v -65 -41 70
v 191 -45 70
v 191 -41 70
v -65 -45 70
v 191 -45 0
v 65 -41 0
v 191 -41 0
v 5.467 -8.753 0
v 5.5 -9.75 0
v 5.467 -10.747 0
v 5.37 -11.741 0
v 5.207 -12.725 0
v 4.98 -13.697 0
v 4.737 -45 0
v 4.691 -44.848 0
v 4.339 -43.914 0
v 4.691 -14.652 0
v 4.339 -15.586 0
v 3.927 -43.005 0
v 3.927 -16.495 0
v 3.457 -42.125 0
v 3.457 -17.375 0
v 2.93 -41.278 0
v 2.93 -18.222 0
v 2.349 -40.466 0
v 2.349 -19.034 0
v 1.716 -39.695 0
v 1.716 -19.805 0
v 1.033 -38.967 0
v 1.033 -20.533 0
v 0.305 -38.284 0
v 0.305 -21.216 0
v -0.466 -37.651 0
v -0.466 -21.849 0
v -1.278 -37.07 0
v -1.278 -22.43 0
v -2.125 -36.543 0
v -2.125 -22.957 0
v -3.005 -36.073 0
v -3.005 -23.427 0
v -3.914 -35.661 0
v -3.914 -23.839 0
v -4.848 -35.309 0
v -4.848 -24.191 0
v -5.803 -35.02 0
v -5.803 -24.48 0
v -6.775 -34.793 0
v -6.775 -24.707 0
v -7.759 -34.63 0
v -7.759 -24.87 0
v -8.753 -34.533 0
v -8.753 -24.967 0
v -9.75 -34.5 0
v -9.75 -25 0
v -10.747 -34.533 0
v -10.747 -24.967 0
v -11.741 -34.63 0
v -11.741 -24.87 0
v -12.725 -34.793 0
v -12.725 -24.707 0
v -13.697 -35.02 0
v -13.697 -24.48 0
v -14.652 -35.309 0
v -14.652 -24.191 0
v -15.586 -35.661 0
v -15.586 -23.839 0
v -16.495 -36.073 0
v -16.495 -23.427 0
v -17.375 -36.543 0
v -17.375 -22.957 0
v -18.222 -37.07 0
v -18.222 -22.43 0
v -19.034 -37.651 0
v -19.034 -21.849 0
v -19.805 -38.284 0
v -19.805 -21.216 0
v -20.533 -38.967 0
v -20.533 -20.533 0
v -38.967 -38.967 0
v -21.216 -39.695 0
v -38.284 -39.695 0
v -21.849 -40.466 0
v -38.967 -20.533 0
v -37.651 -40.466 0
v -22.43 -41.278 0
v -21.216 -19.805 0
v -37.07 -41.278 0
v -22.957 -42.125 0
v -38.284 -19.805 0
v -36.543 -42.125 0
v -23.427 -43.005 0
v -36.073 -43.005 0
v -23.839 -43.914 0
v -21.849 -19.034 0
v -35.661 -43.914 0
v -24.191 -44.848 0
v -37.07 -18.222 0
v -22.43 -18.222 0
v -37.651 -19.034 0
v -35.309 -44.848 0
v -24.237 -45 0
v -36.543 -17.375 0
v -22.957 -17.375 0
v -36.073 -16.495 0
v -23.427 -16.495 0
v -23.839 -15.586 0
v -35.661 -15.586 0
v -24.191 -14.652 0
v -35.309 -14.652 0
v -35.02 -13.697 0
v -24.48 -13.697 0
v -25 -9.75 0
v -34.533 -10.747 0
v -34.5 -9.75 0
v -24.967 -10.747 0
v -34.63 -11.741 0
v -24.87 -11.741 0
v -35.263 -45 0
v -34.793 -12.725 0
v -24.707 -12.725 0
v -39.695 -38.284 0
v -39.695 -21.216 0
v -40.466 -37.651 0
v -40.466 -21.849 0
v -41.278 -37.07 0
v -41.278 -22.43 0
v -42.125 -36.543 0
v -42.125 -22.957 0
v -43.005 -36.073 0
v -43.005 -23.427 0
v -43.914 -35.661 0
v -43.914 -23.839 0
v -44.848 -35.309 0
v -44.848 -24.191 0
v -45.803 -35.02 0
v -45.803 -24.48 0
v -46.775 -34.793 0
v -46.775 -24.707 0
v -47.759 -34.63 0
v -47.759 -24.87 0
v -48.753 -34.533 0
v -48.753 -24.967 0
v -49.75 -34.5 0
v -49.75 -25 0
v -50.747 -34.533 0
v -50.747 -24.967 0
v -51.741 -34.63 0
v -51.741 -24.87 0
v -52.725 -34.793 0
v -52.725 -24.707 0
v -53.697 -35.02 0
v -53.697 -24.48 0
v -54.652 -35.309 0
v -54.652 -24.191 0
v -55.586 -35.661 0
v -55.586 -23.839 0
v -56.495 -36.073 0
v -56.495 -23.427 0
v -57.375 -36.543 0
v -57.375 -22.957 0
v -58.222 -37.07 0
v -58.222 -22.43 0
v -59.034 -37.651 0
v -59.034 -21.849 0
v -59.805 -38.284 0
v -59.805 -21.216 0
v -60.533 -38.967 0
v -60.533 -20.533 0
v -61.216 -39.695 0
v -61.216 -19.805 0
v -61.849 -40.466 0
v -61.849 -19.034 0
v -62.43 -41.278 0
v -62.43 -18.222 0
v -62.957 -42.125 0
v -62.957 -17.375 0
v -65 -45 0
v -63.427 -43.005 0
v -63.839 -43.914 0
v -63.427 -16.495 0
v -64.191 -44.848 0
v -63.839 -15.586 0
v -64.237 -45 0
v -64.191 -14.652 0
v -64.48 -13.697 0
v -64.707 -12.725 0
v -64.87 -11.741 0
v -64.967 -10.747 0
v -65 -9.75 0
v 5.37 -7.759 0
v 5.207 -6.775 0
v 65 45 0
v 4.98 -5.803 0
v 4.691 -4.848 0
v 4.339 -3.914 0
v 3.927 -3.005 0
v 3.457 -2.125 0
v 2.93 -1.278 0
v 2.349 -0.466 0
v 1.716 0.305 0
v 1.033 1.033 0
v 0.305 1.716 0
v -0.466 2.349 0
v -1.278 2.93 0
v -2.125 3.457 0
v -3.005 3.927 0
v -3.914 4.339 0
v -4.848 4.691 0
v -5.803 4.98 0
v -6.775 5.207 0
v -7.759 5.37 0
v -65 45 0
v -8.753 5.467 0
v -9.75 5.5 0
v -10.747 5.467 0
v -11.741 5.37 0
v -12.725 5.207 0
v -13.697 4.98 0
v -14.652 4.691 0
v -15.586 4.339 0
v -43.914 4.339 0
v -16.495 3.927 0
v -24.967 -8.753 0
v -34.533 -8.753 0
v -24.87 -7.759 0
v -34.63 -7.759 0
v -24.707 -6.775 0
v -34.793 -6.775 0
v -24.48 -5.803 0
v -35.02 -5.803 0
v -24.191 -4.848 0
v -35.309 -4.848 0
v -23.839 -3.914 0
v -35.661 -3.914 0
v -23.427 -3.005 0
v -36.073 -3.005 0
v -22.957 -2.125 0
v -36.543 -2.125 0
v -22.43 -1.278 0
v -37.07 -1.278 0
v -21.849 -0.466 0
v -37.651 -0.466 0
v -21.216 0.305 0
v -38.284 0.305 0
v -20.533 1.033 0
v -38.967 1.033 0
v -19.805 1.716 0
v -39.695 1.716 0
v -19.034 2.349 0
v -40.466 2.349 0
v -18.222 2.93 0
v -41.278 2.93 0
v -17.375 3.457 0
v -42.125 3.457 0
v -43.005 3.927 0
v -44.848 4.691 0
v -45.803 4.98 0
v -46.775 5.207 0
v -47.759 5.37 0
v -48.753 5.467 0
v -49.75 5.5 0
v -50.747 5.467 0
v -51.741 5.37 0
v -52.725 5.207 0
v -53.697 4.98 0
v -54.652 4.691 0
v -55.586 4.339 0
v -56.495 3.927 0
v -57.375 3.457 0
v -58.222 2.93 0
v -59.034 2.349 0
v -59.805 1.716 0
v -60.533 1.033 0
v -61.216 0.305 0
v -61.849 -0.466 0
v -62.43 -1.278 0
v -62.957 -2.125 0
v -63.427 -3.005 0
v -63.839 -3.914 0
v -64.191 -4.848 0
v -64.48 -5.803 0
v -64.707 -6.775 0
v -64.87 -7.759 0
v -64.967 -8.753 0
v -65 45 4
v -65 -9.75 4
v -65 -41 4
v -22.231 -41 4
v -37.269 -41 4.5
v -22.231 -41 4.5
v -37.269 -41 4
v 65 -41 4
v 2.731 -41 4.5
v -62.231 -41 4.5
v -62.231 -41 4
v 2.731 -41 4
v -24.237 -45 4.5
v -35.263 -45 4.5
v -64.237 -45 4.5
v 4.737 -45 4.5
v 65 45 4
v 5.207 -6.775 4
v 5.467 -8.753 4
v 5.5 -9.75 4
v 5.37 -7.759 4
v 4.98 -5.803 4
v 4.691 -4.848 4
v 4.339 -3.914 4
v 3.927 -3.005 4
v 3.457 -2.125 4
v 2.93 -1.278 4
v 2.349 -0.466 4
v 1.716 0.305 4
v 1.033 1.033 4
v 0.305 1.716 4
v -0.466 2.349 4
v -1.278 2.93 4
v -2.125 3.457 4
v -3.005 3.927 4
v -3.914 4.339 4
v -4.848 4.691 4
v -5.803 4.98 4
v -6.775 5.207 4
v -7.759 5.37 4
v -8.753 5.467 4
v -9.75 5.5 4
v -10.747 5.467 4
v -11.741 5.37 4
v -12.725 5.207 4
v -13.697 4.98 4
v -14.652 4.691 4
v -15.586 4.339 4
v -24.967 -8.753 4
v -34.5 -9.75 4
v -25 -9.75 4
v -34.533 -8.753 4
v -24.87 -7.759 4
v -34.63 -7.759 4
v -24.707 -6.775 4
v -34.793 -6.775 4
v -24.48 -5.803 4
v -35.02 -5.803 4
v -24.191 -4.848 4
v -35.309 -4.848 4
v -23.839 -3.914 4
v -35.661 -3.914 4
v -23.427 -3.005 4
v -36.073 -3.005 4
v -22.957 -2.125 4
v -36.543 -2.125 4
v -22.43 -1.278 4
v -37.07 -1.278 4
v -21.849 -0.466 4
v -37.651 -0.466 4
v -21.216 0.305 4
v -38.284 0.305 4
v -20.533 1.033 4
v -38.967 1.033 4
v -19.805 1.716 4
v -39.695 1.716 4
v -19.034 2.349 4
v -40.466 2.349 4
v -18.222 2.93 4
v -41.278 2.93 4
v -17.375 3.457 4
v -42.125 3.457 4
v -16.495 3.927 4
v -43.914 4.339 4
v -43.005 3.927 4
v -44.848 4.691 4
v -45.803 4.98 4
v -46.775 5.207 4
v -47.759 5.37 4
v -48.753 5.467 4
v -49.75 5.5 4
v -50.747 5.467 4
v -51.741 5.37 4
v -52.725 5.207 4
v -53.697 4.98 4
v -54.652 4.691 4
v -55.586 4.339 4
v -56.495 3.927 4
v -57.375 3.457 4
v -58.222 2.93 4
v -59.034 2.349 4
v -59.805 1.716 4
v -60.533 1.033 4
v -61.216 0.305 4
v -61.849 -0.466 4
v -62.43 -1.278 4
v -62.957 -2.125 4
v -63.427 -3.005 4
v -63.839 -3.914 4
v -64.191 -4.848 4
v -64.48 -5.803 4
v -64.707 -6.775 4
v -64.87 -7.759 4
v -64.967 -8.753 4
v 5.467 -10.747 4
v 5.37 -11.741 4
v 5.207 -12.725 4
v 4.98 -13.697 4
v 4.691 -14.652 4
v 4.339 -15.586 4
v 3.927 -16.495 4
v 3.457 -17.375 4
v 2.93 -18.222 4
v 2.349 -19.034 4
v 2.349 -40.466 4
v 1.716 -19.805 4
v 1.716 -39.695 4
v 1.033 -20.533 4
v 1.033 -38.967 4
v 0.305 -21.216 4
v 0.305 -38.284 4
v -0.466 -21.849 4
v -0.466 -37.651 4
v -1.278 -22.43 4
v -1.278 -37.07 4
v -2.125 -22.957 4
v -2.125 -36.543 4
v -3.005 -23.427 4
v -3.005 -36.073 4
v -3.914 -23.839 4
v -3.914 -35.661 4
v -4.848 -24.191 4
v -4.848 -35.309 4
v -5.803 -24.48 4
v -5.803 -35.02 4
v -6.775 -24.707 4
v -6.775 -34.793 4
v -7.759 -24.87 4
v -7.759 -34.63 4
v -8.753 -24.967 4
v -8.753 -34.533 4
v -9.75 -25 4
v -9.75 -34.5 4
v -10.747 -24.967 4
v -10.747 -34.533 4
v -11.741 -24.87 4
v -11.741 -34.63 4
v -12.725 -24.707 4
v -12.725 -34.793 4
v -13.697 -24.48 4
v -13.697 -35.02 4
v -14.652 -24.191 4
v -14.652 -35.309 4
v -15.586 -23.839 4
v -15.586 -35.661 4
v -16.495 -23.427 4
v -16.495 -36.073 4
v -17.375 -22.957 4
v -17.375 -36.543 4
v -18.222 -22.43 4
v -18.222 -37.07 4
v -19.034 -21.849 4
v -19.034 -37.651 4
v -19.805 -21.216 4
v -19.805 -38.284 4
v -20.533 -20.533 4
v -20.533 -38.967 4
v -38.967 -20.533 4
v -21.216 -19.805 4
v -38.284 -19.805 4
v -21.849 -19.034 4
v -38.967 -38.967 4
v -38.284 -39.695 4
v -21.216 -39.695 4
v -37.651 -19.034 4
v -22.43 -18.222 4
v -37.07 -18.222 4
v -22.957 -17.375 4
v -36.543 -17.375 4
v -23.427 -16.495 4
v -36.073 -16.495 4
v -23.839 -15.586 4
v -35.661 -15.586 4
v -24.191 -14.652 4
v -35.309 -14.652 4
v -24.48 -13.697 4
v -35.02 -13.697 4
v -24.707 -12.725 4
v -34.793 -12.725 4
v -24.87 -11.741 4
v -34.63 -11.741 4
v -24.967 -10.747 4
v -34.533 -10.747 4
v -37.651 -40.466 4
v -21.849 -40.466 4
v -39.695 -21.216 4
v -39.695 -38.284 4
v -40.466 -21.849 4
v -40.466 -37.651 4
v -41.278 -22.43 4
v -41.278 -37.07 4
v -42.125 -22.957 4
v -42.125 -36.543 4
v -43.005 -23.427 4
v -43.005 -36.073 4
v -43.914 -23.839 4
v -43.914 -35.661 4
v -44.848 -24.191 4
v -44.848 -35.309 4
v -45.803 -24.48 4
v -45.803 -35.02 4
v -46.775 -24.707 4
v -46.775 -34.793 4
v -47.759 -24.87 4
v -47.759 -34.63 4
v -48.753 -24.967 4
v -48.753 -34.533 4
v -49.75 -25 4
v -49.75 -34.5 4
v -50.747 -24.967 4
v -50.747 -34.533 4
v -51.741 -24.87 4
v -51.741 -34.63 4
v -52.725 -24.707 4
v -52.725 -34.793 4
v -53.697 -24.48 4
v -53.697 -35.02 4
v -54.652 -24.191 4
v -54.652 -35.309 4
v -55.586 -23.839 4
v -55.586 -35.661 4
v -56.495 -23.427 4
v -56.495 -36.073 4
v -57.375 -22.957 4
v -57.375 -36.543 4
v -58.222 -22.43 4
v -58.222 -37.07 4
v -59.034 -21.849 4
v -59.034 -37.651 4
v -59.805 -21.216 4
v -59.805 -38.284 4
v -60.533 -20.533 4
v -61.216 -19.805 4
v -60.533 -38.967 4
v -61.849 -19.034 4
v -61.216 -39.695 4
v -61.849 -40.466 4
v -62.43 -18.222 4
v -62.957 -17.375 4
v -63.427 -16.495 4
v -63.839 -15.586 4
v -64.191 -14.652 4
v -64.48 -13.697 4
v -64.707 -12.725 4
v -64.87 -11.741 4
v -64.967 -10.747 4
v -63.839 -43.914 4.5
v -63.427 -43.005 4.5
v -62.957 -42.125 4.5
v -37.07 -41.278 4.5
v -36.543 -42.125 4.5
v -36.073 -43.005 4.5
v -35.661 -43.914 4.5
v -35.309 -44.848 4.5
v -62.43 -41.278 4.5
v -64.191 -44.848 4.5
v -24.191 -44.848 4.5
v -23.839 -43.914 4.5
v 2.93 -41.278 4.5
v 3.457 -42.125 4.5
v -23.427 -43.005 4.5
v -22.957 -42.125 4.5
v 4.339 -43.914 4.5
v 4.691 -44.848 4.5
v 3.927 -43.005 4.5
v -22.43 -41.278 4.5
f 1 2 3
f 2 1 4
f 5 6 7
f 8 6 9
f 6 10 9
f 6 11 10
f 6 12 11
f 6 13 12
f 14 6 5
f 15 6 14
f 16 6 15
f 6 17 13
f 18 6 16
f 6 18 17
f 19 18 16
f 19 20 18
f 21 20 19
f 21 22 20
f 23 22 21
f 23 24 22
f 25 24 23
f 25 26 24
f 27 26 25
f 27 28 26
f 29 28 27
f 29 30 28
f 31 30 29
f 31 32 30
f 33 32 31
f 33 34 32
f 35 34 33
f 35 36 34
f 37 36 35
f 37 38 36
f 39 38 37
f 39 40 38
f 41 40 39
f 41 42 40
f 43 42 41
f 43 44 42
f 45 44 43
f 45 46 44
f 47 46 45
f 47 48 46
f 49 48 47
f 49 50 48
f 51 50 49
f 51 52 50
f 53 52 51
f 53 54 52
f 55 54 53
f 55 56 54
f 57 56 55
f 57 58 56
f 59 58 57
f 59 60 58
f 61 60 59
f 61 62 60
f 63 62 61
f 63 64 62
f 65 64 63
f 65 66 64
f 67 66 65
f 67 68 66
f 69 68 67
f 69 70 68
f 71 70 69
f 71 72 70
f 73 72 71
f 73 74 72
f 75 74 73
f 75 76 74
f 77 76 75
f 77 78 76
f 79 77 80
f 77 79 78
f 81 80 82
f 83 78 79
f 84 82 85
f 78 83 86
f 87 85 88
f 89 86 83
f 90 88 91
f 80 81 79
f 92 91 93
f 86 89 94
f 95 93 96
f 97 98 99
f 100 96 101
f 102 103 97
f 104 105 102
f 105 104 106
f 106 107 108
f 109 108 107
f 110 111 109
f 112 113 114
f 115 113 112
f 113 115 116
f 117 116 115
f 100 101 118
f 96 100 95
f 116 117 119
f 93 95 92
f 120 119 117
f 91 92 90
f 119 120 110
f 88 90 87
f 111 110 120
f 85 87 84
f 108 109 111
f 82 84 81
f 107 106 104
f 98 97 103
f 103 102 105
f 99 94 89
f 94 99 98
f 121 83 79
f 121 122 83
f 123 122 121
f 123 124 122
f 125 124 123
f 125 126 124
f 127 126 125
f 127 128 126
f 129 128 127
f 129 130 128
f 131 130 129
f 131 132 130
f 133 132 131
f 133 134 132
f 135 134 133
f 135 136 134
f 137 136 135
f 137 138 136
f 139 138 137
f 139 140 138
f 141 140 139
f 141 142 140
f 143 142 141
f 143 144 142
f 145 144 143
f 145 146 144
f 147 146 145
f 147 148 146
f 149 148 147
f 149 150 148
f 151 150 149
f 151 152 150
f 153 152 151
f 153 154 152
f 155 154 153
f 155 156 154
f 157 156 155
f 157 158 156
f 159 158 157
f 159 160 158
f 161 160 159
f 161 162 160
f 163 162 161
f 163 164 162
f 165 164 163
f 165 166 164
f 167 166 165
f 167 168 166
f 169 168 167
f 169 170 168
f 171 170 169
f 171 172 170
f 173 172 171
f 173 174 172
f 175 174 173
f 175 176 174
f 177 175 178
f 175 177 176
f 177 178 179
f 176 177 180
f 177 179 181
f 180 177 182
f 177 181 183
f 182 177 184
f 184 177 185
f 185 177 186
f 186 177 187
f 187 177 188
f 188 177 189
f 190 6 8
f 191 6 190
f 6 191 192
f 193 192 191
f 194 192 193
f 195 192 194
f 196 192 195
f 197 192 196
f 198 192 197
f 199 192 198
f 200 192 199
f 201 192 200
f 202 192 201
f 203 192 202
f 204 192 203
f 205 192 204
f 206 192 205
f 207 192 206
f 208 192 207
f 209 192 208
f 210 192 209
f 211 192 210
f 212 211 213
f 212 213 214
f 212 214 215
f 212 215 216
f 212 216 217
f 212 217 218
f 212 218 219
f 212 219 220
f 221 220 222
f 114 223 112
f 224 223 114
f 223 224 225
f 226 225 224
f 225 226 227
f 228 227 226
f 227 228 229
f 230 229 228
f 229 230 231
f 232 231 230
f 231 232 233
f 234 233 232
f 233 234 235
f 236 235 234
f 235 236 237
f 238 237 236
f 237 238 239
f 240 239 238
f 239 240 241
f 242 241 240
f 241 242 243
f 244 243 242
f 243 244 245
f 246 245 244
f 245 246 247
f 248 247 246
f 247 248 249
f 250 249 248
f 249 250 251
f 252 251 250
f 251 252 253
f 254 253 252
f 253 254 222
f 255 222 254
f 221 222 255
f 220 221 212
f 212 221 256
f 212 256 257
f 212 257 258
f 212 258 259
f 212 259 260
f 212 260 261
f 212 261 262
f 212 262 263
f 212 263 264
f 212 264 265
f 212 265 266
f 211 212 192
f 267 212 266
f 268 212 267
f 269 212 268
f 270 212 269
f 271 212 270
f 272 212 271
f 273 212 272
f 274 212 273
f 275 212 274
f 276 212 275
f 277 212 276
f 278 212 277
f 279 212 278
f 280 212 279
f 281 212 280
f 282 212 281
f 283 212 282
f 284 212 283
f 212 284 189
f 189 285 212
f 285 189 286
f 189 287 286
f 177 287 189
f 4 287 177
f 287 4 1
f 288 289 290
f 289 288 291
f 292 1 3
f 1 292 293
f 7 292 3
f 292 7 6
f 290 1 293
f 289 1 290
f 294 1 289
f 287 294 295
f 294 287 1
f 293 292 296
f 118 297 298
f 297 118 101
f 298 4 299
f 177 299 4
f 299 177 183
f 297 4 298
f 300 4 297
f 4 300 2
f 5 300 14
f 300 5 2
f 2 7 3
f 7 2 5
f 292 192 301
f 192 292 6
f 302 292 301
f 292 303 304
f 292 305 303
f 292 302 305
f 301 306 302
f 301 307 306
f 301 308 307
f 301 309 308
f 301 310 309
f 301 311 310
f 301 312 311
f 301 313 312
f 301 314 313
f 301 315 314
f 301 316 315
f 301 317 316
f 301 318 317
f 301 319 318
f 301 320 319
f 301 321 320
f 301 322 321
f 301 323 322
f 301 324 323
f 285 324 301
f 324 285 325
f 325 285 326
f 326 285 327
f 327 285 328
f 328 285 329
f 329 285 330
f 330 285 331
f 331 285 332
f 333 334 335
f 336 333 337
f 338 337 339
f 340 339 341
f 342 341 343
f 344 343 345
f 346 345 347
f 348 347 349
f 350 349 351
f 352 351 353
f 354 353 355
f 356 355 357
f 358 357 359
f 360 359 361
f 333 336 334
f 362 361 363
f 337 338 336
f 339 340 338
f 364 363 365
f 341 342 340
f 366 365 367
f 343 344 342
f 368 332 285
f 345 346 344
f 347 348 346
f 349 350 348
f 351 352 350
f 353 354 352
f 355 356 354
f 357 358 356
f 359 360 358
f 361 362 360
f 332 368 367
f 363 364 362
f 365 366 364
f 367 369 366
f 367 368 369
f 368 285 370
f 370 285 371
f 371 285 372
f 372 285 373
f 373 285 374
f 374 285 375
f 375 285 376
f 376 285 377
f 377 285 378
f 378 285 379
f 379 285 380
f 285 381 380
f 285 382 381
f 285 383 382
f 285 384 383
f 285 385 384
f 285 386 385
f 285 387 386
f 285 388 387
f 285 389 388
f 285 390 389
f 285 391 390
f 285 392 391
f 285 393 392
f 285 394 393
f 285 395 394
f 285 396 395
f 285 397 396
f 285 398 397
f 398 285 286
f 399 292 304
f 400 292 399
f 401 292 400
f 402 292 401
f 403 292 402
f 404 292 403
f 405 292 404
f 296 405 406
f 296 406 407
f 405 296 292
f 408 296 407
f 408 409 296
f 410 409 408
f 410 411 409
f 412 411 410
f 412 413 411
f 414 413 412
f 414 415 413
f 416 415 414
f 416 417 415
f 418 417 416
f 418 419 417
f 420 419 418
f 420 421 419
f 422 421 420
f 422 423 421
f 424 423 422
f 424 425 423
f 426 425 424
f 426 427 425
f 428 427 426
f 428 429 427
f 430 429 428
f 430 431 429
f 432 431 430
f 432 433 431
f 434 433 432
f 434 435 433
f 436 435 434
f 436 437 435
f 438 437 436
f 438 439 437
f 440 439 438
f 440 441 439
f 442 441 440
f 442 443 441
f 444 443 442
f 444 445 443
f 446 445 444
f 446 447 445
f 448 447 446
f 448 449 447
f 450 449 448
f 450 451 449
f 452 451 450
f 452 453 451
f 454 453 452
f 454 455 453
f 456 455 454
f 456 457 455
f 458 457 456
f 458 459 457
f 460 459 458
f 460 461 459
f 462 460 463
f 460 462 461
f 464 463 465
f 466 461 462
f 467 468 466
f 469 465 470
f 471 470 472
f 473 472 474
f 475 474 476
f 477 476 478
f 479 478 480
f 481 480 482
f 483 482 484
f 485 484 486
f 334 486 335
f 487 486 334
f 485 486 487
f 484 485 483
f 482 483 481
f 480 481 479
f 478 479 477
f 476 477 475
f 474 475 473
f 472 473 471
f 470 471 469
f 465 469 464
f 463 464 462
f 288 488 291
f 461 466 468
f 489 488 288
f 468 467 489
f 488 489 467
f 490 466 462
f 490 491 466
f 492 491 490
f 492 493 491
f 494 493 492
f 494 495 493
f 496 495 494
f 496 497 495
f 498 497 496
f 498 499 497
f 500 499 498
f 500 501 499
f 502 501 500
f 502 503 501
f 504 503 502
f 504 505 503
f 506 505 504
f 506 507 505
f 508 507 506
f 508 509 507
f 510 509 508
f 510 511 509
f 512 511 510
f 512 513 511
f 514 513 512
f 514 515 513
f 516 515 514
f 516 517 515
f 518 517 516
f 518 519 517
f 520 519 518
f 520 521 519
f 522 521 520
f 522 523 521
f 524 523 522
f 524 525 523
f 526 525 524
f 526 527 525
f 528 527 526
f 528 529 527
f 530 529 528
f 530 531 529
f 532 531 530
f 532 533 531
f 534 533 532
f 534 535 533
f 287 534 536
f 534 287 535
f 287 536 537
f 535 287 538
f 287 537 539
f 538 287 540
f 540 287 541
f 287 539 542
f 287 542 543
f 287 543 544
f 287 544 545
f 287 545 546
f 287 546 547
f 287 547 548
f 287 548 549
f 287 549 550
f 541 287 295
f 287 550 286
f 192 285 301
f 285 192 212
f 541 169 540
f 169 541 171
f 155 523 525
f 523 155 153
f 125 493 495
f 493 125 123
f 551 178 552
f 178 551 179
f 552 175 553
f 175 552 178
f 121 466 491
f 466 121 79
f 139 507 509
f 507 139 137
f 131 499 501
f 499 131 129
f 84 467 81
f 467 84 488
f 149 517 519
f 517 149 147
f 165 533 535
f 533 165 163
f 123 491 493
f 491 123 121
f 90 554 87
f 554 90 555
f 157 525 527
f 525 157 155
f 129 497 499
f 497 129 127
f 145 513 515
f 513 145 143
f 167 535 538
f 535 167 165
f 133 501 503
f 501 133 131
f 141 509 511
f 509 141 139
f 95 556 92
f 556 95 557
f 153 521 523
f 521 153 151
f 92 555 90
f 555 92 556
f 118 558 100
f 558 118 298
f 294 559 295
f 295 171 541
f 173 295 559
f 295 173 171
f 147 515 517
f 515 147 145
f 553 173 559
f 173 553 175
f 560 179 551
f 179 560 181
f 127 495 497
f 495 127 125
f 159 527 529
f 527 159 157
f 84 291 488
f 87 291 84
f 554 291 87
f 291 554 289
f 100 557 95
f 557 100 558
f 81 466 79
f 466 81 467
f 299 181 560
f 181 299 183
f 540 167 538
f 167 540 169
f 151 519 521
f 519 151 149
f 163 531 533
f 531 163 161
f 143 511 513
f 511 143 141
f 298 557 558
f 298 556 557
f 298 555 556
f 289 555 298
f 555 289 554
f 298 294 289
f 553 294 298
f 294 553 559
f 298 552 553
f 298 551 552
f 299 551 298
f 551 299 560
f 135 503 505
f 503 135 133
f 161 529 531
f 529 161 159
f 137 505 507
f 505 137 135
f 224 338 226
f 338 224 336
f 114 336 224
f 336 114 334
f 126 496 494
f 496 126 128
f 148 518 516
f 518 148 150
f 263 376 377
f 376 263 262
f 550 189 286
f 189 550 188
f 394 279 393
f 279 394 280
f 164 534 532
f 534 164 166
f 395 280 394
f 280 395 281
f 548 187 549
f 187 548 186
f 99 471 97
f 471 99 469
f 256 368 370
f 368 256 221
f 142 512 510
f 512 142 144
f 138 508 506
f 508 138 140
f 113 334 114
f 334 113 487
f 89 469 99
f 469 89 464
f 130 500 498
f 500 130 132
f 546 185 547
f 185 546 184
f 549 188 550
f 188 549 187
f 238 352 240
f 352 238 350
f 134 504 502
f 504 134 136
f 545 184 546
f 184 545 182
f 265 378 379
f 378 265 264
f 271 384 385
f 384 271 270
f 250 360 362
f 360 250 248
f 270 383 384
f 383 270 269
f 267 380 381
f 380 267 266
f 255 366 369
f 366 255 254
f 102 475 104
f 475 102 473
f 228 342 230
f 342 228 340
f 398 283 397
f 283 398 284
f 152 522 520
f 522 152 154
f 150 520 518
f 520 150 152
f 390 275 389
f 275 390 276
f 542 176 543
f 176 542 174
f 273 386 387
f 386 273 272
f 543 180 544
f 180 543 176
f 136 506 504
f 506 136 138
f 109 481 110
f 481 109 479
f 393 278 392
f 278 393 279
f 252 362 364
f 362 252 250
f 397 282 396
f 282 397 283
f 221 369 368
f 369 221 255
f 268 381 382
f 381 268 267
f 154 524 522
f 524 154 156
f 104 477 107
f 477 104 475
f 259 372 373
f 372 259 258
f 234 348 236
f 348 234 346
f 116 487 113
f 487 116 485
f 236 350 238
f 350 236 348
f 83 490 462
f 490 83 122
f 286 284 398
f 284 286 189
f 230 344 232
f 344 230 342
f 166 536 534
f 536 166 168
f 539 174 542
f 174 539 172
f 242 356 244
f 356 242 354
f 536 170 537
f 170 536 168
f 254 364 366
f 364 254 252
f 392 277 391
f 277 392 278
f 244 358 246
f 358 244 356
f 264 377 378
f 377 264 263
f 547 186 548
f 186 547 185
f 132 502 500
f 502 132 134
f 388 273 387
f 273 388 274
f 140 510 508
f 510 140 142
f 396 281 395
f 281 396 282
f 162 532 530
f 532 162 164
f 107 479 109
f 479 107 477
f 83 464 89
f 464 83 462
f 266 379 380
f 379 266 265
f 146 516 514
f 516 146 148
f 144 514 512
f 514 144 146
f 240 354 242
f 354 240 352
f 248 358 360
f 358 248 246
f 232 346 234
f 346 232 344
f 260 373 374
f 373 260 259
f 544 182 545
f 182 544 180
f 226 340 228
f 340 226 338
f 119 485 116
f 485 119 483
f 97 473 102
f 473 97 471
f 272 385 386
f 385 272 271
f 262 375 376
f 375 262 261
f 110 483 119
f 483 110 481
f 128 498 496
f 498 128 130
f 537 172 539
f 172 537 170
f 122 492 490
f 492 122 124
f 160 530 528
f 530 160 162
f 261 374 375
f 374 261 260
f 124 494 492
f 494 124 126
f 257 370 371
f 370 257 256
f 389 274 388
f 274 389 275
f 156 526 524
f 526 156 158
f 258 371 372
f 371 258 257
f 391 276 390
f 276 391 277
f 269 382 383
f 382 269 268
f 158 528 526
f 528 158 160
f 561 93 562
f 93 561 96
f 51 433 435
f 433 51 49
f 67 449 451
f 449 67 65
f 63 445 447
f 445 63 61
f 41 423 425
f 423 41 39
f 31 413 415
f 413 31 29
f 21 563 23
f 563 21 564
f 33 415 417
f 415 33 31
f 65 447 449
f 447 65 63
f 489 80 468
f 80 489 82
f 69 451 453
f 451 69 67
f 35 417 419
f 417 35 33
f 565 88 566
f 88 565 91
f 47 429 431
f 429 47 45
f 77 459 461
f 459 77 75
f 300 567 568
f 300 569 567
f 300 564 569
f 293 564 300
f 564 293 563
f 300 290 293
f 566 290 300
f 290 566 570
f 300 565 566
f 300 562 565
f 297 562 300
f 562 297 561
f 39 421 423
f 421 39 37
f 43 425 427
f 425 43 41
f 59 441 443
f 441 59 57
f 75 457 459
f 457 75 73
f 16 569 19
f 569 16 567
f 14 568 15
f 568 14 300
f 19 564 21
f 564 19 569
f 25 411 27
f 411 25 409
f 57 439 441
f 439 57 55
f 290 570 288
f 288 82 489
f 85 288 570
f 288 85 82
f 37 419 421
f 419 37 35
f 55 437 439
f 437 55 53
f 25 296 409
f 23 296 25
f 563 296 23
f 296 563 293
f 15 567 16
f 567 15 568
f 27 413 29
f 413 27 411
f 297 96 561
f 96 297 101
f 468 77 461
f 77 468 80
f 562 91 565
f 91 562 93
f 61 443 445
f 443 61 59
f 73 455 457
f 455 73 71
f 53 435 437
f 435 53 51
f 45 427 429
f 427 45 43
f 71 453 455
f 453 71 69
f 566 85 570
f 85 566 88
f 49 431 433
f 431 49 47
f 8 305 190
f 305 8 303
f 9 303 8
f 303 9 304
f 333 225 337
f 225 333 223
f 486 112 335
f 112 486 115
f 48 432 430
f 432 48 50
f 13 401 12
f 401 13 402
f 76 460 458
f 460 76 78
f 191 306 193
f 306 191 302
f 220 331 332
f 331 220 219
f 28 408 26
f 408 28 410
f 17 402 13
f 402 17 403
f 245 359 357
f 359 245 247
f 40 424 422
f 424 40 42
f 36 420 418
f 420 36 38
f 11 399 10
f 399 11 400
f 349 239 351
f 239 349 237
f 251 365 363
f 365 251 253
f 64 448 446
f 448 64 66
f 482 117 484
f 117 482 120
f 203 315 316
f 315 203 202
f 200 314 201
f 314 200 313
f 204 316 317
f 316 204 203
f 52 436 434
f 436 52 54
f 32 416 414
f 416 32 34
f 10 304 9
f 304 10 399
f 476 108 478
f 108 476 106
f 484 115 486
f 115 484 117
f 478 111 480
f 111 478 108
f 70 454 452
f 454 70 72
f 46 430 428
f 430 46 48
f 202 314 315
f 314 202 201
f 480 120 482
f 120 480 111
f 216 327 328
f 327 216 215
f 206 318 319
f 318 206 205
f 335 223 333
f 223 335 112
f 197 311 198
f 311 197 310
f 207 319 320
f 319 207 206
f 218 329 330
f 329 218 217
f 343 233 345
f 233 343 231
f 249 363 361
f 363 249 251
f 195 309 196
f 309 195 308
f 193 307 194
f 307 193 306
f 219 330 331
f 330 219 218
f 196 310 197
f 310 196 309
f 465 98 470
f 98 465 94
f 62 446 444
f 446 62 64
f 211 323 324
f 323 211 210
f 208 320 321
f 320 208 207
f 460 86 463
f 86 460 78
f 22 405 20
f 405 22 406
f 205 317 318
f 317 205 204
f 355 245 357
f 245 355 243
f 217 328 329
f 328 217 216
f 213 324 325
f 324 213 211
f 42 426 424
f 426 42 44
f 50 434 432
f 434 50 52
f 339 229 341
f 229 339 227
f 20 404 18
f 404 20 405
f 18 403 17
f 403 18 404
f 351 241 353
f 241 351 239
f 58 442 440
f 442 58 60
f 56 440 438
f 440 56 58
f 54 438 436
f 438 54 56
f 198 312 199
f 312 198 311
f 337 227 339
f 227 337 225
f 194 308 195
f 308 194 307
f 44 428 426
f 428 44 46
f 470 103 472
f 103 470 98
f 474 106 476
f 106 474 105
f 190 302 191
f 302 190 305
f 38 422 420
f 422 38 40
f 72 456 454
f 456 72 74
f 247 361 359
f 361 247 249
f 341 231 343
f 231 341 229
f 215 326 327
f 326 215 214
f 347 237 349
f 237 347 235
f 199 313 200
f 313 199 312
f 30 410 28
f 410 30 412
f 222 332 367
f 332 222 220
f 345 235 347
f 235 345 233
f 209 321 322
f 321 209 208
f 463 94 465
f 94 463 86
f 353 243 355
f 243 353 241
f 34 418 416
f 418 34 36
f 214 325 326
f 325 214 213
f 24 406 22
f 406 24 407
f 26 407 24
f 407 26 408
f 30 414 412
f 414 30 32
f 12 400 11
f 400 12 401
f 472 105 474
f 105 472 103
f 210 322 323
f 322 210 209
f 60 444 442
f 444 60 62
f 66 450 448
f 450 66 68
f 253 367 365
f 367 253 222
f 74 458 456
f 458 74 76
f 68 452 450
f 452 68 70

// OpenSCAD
// Rack for six 50 mL conical (Falcon-type) tubes
// Print orientation: flat plate on bed, walls rising to z = 70
// After printing, flip the part so the walls stand on the bed

// ---------- Parameters ----------
plate_x      = 130;   // plate length along X
plate_y      = 90;    // plate width along Y
plate_t      = 4;     // plate thickness (z = 0 to 4)

hole_d       = 30.5;  // through-hole diameter
hole_nx      = 3;     // holes along X per row
hole_ny      = 2;     // holes along Y per row
hole_pitch   = 40;    // centre-to-centre spacing in X and Y

wall_len     = 130;   // wall length along X
wall_t       = 4;     // wall thickness along Y
wall_h       = 70;    // wall top height (z)

eps          = 0.5;   // cutter overshoot past faces
$fn          = 96;    // curve resolution

// ---------- Model ----------
difference() {
    union() {
        // Base plate
        translate([-plate_x/2, -plate_y/2, 0])
            cube([plate_x, plate_y, plate_t]);

        // Two solid walls along the long edges, rising to z = 70
        for (s = [-1, 1])
            translate([s > 0 ? plate_x/2 - wall_t : -plate_x/2,
                       -plate_y/2,
                       0])
                cube([wall_len, wall_t, wall_h]);
    }

    // Through-holes in a 2 x 3 grid, centred on the plate
    for (i = [0 : hole_nx - 1])
        for (j = [0 : hole_ny - 1])
            translate([(i - (hole_nx - 1)/2) * hole_pitch - plate_x/2 + hole_d/2,
                       (j - (hole_ny - 1)/2) * hole_pitch - plate_y/2 + hole_d/2,
                       -eps])
                cylinder(d = hole_d, h = plate_t + 2 * eps);
}
